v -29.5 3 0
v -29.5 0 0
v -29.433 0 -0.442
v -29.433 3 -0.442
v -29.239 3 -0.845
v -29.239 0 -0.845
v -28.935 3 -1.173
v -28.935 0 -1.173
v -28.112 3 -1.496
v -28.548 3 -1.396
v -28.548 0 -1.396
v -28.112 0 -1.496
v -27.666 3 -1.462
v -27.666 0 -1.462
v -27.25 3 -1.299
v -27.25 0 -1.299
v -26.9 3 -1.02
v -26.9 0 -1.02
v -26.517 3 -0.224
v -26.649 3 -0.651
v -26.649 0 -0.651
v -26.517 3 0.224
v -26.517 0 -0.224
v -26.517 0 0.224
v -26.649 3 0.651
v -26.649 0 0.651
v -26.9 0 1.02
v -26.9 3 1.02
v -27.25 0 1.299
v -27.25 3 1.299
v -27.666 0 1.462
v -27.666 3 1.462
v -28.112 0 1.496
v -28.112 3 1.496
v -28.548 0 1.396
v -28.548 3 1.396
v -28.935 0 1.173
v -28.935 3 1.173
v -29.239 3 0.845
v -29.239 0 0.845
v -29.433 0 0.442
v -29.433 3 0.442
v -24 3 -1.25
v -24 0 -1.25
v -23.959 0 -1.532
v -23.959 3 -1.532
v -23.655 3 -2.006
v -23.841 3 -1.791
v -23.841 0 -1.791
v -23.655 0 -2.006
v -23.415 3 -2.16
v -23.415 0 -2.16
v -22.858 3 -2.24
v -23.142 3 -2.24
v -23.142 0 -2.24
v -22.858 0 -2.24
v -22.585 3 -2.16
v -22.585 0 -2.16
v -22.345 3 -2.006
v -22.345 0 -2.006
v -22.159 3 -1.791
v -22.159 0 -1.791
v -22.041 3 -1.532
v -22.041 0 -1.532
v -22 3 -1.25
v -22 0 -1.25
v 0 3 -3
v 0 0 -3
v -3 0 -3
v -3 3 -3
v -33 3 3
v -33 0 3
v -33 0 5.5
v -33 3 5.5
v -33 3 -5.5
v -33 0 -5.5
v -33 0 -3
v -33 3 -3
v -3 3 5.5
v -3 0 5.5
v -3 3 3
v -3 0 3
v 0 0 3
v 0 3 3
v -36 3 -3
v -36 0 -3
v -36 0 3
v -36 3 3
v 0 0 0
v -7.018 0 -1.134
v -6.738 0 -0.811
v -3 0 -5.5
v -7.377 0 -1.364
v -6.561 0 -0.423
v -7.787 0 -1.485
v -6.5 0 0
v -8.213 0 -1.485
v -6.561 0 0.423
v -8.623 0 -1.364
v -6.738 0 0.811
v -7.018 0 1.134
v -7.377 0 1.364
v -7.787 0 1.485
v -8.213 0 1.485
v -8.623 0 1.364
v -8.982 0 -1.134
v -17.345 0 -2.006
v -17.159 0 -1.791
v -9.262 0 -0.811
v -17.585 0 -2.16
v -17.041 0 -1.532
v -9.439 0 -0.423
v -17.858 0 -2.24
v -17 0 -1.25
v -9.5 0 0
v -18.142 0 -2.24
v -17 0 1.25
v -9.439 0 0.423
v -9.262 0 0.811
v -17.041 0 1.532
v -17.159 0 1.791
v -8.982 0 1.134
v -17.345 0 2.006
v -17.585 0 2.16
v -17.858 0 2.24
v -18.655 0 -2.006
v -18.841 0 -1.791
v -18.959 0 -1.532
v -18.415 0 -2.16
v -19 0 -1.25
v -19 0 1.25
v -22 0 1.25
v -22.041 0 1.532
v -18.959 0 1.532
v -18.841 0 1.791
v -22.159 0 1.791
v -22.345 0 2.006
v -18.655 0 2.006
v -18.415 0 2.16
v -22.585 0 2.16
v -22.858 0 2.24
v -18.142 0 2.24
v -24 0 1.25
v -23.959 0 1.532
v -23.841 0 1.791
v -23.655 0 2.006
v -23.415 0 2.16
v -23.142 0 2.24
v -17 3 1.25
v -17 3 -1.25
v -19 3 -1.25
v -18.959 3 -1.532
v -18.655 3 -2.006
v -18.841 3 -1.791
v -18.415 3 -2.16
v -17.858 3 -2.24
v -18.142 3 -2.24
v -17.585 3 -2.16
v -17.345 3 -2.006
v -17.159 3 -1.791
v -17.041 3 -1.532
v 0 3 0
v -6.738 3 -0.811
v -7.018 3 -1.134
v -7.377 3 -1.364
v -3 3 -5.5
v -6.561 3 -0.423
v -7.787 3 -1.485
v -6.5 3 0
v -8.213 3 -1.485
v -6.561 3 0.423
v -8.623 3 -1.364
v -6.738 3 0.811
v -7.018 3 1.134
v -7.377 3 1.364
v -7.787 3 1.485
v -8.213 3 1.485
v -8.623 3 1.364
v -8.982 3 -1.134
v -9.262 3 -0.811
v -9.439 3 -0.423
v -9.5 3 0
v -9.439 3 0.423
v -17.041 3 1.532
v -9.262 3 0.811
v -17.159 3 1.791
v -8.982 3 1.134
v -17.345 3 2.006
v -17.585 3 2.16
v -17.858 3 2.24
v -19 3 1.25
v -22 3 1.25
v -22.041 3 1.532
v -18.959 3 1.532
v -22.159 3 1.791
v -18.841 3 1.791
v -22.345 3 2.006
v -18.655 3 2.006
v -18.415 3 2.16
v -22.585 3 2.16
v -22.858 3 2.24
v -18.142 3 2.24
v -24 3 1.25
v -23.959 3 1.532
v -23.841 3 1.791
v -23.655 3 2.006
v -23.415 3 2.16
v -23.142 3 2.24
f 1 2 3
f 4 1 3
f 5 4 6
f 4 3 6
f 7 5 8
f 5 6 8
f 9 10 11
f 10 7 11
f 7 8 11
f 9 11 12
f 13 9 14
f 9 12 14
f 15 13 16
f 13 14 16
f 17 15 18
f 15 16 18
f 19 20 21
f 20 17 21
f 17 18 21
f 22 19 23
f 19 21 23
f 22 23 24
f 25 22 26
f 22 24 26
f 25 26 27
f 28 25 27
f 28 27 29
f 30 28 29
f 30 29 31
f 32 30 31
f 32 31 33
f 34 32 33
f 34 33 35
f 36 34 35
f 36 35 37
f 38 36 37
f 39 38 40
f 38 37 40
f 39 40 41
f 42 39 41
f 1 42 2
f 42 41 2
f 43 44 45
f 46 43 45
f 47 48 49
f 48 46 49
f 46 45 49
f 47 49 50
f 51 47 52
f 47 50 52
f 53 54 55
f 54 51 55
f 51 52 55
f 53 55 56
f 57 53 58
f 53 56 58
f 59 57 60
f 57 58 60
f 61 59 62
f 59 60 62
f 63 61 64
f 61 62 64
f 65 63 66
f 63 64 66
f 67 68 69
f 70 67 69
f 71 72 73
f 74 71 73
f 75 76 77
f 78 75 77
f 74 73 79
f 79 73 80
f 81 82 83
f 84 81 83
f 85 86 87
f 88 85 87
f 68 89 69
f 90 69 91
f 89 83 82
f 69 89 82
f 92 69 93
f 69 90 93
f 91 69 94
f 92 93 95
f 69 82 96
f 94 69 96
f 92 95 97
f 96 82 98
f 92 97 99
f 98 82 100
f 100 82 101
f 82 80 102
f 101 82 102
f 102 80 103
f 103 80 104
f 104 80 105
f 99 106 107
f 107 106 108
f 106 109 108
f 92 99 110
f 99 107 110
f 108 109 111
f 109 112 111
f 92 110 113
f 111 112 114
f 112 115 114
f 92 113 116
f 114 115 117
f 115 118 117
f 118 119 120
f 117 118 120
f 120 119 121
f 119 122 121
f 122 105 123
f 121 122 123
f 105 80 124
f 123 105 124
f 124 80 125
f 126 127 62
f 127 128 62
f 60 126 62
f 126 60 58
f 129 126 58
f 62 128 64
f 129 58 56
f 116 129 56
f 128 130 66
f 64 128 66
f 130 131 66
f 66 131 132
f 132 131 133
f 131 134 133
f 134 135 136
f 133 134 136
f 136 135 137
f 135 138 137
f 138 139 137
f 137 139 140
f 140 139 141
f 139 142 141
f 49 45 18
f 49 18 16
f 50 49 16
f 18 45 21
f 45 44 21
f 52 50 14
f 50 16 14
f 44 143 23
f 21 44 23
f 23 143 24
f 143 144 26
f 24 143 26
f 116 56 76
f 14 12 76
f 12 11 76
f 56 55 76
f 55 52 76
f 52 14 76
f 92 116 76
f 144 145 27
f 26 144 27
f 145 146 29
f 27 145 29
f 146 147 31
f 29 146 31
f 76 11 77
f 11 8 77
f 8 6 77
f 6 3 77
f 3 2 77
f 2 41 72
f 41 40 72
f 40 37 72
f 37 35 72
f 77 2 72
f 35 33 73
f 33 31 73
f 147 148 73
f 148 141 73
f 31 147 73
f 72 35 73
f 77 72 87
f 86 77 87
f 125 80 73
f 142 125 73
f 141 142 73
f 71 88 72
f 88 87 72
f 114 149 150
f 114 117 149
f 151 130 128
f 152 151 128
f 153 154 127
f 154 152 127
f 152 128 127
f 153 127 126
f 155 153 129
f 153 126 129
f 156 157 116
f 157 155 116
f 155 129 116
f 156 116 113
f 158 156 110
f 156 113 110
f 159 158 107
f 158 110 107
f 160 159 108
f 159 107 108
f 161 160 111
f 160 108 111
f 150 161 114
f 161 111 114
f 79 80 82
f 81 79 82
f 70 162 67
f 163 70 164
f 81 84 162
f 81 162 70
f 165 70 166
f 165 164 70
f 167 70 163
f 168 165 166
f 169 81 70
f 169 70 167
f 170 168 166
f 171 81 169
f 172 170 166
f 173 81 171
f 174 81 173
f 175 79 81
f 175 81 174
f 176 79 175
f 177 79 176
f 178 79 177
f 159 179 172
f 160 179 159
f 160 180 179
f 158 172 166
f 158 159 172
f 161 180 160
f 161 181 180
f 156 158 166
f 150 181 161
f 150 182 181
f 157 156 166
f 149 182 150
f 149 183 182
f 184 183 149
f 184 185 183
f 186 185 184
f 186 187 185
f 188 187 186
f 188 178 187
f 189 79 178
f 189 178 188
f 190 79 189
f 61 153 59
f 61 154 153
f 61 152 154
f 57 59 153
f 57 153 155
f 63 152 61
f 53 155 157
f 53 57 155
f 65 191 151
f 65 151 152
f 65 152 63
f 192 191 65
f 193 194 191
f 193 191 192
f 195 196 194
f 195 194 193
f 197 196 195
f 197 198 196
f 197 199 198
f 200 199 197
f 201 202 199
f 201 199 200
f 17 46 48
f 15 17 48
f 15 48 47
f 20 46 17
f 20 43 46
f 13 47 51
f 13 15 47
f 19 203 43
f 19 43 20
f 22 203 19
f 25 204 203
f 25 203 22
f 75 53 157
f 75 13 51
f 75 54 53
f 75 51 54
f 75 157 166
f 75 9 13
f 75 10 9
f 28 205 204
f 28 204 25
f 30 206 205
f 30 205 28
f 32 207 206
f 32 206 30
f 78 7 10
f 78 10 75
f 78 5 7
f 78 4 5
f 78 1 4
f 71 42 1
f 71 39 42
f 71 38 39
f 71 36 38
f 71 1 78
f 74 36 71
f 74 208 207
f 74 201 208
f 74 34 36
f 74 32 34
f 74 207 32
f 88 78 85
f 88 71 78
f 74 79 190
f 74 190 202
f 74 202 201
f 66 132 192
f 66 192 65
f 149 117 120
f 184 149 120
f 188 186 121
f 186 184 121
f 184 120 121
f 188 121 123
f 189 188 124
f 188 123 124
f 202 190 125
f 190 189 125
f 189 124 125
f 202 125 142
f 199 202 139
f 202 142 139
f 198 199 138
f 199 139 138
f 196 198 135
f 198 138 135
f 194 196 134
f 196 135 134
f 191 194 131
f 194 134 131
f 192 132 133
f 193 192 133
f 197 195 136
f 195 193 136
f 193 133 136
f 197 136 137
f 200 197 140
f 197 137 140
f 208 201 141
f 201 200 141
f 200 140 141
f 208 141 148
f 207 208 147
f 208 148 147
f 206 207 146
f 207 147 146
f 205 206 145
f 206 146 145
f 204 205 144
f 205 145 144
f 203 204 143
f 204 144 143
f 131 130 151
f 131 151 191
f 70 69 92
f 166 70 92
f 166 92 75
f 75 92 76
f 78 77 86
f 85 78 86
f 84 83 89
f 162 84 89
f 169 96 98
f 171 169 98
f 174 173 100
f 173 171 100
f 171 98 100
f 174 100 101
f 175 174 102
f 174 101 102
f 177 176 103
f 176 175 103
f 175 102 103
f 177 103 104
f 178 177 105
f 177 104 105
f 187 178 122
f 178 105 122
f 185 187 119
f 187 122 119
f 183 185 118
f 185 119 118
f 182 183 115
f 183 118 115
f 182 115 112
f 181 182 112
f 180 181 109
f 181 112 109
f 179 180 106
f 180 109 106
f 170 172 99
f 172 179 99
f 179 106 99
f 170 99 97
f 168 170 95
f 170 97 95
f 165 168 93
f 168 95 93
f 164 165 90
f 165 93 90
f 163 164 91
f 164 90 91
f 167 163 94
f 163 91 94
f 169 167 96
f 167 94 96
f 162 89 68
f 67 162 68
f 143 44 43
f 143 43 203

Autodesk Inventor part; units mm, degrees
ref_plane "YZ Plane" through (0, 0, 0) normal (1, 0, 0) x (0, 1, 0)
ref_plane "XZ Plane" through (0, 0, 0) normal (0, 1, 0) x (-1, 0, 0)
ref_plane "XY Plane" through (0, 0, 0) normal (0, 0, 1) x (1, 0, 0)
sketch "Sketch1" plane through (0, 0, 0) normal (0, 1, 0) x (-1, 0, 0)
  line L0 (0, 0) -> (0, -3)
  line L1 (0, -3) -> (3, -3)
  line L2 (3, -3) -> (3, -5.5)
  line L3 (3, -5.5) -> (33, -5.5)
  line L4 (33, -5.5) -> (33, -3)
  line L5 (33, -3) -> (36, -3)
  line L6 (36, -3) -> (36, 3)
  line L7 (36, 3) -> (33, 3)
  line L8 (33, 3) -> (33, 5.5)
  line L9 (33, 5.5) -> (3, 5.5)
  line L10 (3, 5.5) -> (3, 3)
  line L11 (3, 3) -> (0, 3)
  line L12 (0, 3) -> (0, 0)
  circle A0 centre (28, 0) radius 1.5
  line L13 (0, 0) -> (8, 0)
  circle A1 centre (8, 0) radius 1.5
  arc A2 (17, -1.25) -> (19, -1.25) centre (18, -1.25) ccw
  arc A3 (19, 1.25) -> (17, 1.25) centre (18, 1.25) ccw
  line L14 (19, -1.25) -> (19, 1.25)
  line L15 (17, 1.25) -> (17, -1.25)
  arc A4 (22, -1.25) -> (24, -1.25) centre (23, -1.25) ccw
  arc A5 (24, 1.25) -> (22, 1.25) centre (23, 1.25) ccw
  line L16 (24, -1.25) -> (24, 1.25)
  line L17 (22, 1.25) -> (22, -1.25)
  dimension "d15" = 3
  dimension "d16" = 3
  dimension "d17" = 2.5
  dimension "d18" = 30
  dimension "d19" = 3
  dimension "d20" = 6
  dimension "d21" = 2.5
  dimension "d22" = 30
  dimension "d26" = 8
  dimension "d27" = 3
  dimension "d31" = 8
  dimension "d34" = 1
  dimension "d35" = 11
  dimension "d36" = 20
  dimension "d38" = 1
extrude "Extrusion1" add sketch "Sketch1" along normal blind 3
properties part number "Laser Mount Plate" material "Polycarbonate, Smoke"
